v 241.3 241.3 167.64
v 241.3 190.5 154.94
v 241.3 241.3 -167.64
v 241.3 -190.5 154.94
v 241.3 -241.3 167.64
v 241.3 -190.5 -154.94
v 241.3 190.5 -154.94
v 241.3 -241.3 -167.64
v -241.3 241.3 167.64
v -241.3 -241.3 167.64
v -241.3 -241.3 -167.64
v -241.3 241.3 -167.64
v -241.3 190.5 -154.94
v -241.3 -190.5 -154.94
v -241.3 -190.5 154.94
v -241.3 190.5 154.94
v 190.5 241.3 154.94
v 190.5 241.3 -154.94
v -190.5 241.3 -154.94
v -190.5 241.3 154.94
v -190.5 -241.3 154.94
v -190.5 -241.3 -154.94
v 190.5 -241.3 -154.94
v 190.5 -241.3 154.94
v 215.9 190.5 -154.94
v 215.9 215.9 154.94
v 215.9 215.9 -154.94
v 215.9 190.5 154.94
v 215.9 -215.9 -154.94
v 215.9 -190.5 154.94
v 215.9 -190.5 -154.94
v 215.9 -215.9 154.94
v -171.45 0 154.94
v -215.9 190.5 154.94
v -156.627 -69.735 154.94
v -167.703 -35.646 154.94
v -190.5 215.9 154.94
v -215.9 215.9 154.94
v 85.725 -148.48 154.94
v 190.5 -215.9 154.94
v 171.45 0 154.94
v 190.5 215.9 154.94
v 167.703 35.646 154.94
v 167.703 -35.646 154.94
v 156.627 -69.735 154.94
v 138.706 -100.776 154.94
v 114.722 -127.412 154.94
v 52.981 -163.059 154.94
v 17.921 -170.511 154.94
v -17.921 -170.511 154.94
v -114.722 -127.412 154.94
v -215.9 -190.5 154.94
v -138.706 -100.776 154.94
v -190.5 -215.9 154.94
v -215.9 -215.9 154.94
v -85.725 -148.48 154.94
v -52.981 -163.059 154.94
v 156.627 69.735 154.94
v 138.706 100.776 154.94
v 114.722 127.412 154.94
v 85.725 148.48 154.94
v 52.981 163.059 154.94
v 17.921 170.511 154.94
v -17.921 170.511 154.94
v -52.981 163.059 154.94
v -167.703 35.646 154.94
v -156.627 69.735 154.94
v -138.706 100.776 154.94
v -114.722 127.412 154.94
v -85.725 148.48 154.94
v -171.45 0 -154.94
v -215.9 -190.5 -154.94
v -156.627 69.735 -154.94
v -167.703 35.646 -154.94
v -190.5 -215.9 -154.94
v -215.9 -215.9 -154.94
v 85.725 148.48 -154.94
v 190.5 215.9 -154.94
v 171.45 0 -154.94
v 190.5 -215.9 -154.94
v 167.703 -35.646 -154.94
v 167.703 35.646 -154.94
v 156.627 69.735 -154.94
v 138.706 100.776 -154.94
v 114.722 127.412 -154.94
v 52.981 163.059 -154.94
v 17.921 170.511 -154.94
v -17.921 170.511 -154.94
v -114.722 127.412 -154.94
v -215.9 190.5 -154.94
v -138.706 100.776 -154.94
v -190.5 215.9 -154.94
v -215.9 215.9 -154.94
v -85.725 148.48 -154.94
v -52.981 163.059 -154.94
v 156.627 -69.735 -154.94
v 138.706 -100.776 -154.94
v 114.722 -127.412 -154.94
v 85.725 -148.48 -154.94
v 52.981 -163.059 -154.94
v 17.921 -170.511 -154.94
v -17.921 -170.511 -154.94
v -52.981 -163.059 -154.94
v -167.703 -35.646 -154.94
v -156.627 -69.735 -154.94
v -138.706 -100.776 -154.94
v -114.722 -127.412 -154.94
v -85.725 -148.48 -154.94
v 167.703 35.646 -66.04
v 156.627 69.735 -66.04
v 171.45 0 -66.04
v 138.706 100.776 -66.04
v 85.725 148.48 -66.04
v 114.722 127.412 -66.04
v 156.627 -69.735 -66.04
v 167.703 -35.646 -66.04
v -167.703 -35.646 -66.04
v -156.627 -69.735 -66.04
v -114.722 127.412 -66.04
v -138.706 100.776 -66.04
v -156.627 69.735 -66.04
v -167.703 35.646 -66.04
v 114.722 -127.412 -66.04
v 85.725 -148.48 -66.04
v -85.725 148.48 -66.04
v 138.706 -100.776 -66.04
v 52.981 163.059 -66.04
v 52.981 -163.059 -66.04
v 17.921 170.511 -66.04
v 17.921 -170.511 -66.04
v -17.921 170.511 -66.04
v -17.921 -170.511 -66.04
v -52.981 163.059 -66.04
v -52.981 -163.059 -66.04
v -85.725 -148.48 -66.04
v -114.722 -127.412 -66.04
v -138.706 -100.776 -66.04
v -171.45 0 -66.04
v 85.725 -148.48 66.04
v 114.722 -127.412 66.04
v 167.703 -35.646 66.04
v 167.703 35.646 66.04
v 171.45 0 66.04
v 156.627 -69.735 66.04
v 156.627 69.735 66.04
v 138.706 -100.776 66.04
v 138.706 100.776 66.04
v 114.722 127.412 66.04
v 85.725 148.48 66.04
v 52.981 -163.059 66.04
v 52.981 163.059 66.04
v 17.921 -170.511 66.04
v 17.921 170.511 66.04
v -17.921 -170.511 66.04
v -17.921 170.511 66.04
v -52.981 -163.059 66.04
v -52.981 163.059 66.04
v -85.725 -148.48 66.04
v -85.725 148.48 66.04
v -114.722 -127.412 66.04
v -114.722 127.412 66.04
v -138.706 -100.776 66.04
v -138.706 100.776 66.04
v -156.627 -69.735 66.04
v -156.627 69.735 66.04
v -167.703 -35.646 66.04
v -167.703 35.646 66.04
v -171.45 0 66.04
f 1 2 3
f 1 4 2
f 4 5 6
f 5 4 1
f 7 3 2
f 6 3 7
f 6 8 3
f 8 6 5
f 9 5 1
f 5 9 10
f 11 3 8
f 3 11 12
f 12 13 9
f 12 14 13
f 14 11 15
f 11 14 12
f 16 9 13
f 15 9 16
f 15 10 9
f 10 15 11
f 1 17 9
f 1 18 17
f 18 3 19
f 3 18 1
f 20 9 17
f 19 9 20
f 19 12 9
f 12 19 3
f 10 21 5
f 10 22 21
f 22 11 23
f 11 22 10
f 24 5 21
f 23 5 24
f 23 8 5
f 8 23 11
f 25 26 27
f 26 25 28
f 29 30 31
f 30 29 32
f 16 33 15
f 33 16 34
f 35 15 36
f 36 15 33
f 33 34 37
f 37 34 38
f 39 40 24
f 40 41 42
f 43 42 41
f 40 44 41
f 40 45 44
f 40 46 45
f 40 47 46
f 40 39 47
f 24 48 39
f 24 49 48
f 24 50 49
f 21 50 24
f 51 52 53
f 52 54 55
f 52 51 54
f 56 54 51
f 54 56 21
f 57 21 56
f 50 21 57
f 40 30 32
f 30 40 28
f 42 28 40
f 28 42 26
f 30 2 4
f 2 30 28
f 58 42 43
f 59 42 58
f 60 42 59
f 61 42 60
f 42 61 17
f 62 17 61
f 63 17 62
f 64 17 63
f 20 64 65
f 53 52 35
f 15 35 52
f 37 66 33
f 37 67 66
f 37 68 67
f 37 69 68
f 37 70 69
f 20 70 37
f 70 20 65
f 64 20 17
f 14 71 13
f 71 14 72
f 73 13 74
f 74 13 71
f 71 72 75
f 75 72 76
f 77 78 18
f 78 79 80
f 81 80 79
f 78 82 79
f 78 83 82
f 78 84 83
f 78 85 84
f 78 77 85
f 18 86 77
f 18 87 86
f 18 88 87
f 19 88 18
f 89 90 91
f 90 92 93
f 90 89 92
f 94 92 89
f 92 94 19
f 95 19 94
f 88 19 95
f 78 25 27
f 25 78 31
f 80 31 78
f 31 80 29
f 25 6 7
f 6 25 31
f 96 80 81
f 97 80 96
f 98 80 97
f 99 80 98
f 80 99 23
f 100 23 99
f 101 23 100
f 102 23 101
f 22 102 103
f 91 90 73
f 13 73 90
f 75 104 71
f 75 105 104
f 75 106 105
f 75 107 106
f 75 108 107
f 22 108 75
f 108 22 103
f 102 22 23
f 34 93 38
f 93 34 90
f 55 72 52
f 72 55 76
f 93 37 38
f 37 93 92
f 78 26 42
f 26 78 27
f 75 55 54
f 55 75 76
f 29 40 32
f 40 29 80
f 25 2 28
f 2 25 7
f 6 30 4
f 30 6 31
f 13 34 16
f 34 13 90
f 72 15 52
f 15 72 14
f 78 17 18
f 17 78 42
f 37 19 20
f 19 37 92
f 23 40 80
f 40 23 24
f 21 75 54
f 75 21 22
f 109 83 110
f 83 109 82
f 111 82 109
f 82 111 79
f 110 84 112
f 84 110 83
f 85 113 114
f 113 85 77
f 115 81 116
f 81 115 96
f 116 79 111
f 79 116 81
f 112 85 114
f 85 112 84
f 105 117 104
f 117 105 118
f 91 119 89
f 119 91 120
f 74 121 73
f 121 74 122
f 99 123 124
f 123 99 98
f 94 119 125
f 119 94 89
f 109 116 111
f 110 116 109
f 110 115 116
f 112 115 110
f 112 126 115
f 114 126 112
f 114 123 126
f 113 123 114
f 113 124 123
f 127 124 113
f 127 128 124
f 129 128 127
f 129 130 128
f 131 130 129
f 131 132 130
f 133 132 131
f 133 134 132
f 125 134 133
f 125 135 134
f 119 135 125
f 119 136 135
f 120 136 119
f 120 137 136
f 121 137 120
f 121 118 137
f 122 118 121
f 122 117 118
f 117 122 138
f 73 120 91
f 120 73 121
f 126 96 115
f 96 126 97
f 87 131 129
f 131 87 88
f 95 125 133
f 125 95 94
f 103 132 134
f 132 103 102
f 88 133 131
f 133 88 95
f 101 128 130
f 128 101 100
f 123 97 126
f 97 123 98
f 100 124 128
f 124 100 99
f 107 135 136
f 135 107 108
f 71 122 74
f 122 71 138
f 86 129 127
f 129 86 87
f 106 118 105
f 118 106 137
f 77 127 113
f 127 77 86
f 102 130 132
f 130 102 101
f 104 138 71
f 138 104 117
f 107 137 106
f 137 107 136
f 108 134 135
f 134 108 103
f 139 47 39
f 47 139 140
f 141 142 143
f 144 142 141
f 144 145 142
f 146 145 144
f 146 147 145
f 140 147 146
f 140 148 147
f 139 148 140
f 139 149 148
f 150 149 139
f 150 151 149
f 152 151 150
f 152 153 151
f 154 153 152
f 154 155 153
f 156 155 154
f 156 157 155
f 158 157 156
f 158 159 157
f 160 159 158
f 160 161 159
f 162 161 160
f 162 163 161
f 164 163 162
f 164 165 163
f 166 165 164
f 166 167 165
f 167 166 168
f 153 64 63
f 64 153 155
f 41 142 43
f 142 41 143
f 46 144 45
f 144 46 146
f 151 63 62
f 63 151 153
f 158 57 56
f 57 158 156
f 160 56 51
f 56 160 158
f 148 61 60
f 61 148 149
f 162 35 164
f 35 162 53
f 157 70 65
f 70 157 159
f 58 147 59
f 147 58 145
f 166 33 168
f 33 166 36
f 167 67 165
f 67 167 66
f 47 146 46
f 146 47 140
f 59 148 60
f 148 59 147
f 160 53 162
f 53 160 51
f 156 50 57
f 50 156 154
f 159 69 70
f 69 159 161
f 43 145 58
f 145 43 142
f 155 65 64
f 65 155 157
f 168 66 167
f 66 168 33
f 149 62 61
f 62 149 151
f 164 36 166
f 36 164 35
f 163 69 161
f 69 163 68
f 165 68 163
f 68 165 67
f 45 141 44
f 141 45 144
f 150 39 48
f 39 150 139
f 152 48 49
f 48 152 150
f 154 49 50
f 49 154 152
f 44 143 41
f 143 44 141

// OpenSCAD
//Model of Permanent magnet from ningbo


module Permanent_magnet(){
Magnet_L = 482.6;
Magnet_W = 482.6;
Magnet_H = 335.28;
Rail_Thickness = 25.4;
Post_Thickness = 50.8;
Cylinder_D = 342.9;
Cylinder_H = 88.9;


union(){
difference(){ 
cube([Magnet_W,Magnet_L,Magnet_H],true);
cube([Magnet_W-Post_Thickness,Magnet_L-Post_Thickness,Magnet_H-Rail_Thickness],true);
translate([Magnet_W/2,0,0])    
cube([Magnet_W-(2*Post_Thickness),Magnet_L-(2*Post_Thickness),Magnet_H-Rail_Thickness],true);
translate([-(Magnet_W/2),0,0])    
cube([Magnet_W-(2*Post_Thickness),Magnet_L-(2*Post_Thickness),Magnet_H-Rail_Thickness],true);
translate([0,Magnet_W/2,0])    
cube([Magnet_W-(2*Post_Thickness),Magnet_L-(2*Post_Thickness),Magnet_H-Rail_Thickness],true);
translate([0,-(Magnet_W/2),0])    
cube([Magnet_W-(2*Post_Thickness),Magnet_L-(2*Post_Thickness),Magnet_H-Rail_Thickness],true);
}
translate([0,0,-(Magnet_H/2)+Rail_Thickness/2])
cylinder(d = Cylinder_D,h=Cylinder_H);

translate([0,0,(Magnet_H/2)-Rail_Thickness/2])
mirror([0,0,1])
cylinder(d = Cylinder_D,h=Cylinder_H);
}
}
Permanent_magnet();
